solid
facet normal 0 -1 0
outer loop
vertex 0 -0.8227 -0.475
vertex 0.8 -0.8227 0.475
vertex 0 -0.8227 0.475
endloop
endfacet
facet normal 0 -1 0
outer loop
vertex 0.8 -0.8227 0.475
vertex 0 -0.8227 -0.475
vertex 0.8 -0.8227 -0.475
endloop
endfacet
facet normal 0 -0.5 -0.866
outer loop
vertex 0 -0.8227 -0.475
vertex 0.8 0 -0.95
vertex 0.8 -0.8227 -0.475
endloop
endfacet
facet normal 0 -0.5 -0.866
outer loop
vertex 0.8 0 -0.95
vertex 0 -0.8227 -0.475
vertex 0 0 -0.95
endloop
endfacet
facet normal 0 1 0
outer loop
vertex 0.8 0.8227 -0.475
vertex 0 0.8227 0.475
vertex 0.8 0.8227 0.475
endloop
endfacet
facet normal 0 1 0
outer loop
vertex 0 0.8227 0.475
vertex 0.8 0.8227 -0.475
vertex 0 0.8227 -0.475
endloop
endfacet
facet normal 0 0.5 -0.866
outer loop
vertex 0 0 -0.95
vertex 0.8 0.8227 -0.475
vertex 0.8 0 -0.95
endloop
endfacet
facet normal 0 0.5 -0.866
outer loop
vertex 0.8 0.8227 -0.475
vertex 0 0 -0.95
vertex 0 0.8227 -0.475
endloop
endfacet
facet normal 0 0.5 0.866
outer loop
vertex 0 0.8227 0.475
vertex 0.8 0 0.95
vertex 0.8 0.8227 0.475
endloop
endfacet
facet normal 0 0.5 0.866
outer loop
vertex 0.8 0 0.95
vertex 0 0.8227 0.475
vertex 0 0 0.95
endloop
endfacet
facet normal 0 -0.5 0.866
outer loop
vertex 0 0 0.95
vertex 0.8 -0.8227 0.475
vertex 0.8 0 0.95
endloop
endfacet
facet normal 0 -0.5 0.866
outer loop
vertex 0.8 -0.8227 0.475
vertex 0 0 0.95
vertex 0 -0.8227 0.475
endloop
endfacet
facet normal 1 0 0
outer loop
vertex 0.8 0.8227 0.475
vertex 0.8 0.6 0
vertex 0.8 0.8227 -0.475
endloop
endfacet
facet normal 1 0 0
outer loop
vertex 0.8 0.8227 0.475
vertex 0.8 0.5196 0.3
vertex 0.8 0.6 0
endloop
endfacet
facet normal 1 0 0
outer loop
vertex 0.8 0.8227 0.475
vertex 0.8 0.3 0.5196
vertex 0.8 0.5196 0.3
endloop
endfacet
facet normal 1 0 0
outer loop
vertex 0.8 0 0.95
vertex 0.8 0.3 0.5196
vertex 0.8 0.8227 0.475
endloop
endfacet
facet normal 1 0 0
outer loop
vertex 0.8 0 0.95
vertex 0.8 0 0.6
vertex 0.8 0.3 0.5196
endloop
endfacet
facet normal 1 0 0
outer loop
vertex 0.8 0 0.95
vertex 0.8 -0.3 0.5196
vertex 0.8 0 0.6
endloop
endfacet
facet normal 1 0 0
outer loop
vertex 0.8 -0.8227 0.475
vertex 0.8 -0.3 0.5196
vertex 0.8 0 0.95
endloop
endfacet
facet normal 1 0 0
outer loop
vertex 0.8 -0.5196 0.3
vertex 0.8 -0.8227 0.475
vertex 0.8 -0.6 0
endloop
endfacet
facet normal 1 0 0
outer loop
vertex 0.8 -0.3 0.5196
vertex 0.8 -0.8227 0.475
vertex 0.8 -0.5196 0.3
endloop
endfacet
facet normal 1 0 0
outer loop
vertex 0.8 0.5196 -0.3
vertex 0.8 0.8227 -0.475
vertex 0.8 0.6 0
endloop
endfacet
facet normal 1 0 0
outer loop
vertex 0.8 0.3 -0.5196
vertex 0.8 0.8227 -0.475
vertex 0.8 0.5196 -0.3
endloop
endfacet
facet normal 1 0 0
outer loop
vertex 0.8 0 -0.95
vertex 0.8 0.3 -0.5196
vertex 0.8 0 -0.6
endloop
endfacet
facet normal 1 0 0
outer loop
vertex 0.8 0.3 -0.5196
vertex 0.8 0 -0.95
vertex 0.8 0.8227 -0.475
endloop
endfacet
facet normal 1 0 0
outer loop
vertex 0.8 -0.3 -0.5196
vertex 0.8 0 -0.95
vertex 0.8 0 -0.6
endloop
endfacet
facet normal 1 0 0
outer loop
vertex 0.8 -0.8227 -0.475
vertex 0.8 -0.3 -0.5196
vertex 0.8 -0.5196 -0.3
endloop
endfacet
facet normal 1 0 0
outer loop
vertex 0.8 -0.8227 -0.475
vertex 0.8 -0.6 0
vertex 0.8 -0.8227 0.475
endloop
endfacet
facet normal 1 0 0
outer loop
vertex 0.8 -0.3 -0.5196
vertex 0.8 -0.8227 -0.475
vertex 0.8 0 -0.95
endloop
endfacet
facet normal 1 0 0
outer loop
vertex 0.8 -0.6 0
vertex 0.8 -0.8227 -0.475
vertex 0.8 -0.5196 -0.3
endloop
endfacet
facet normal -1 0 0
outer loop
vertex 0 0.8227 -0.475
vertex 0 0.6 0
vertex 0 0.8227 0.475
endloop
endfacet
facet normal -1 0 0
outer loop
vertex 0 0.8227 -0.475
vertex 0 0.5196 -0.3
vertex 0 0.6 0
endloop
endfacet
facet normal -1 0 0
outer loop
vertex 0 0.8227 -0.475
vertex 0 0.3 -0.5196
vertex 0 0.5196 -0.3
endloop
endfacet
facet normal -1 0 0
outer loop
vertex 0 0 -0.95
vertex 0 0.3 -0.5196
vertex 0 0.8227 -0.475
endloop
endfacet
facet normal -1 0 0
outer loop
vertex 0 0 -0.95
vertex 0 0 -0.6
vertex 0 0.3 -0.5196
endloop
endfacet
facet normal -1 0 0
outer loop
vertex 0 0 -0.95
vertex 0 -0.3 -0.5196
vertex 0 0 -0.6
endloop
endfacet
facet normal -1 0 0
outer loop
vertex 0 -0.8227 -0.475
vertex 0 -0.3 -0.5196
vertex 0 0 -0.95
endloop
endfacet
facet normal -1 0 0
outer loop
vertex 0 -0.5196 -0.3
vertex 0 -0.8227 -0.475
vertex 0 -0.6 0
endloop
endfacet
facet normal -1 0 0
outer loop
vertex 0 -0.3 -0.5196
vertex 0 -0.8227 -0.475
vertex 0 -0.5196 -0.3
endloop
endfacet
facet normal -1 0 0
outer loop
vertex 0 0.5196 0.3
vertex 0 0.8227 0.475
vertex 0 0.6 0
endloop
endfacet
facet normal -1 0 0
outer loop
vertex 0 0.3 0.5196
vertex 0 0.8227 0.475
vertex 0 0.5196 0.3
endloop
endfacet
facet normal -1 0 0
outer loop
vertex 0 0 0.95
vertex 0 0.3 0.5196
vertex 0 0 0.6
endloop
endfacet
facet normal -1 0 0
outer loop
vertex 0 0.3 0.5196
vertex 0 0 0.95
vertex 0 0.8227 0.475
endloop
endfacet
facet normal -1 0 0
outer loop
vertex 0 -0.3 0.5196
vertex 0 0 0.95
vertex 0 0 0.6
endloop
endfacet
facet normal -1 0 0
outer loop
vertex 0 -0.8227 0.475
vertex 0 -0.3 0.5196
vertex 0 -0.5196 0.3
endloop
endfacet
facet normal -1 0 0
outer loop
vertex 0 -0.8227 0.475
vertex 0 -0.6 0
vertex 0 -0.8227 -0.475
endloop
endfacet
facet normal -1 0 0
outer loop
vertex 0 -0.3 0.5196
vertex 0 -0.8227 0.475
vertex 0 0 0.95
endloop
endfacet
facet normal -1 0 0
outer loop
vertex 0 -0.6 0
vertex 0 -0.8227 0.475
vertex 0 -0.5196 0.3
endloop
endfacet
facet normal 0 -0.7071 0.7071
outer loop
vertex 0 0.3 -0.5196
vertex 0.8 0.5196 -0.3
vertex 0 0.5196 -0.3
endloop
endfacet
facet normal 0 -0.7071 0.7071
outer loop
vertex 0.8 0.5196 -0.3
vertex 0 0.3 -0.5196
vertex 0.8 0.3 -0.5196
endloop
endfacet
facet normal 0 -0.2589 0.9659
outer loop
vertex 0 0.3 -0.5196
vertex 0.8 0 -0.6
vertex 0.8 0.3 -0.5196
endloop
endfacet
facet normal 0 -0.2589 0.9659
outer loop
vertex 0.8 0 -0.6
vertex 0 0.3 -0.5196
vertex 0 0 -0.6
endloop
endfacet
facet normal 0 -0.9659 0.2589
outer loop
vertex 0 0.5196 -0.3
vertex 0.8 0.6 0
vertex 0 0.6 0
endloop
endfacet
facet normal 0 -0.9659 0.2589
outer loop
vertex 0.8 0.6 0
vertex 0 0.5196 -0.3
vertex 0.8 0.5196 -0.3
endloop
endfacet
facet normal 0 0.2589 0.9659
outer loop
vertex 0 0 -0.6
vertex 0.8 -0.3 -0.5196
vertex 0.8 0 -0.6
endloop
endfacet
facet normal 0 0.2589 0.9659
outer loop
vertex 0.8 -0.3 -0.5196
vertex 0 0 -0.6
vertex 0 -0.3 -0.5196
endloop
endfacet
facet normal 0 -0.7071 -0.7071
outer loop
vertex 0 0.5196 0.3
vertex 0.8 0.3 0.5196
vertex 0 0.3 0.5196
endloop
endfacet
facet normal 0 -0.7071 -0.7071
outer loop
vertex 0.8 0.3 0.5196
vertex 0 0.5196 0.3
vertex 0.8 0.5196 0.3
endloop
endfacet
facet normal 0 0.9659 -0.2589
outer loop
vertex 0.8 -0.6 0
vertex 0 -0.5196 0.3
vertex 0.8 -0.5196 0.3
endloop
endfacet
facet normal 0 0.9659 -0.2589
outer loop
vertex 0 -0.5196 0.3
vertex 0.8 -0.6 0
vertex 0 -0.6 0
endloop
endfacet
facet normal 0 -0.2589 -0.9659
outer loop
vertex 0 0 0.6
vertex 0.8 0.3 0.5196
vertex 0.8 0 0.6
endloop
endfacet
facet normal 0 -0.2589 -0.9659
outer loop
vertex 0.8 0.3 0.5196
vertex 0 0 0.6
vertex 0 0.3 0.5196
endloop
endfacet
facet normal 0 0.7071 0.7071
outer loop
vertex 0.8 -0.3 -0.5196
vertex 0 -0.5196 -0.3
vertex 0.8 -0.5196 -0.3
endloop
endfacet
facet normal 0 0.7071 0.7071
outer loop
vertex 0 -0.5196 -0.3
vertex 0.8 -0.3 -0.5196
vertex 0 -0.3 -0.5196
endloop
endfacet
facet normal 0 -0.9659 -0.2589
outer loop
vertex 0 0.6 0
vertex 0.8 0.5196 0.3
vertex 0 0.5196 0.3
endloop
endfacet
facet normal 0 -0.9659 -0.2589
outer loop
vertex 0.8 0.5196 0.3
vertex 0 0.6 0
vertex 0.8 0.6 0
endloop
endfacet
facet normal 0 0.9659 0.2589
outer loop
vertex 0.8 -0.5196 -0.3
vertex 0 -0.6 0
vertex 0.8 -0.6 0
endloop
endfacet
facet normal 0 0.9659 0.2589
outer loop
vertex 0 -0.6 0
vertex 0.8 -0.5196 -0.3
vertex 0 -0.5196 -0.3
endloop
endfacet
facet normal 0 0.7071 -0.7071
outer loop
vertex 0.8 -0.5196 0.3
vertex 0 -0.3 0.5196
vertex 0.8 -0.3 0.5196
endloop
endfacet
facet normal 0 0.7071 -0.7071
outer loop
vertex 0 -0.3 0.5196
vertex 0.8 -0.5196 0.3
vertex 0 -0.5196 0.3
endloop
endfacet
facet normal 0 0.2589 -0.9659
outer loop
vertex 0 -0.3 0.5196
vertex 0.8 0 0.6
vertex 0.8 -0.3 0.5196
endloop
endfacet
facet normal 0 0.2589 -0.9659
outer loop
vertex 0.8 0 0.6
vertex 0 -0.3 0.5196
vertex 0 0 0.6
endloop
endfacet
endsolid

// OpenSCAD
module nut(rotation=0) 
{
    hex_diameter = 1.9;
    hex_length = 0.8;
    hole = 1.20;
 
    
    rotate([0,90,rotation]) 
    color([0.0,0.8,1.0])
    translate([0,0,hex_length*0.5]) 
    {
        difference() {
            cylinder(h=hex_length, r=hex_diameter/2, $fn = 6, center=true);
            cylinder(h=hex_length+0.1, r=hole/2, $fn = 12, center=true);
        }
    }
}

nut();
